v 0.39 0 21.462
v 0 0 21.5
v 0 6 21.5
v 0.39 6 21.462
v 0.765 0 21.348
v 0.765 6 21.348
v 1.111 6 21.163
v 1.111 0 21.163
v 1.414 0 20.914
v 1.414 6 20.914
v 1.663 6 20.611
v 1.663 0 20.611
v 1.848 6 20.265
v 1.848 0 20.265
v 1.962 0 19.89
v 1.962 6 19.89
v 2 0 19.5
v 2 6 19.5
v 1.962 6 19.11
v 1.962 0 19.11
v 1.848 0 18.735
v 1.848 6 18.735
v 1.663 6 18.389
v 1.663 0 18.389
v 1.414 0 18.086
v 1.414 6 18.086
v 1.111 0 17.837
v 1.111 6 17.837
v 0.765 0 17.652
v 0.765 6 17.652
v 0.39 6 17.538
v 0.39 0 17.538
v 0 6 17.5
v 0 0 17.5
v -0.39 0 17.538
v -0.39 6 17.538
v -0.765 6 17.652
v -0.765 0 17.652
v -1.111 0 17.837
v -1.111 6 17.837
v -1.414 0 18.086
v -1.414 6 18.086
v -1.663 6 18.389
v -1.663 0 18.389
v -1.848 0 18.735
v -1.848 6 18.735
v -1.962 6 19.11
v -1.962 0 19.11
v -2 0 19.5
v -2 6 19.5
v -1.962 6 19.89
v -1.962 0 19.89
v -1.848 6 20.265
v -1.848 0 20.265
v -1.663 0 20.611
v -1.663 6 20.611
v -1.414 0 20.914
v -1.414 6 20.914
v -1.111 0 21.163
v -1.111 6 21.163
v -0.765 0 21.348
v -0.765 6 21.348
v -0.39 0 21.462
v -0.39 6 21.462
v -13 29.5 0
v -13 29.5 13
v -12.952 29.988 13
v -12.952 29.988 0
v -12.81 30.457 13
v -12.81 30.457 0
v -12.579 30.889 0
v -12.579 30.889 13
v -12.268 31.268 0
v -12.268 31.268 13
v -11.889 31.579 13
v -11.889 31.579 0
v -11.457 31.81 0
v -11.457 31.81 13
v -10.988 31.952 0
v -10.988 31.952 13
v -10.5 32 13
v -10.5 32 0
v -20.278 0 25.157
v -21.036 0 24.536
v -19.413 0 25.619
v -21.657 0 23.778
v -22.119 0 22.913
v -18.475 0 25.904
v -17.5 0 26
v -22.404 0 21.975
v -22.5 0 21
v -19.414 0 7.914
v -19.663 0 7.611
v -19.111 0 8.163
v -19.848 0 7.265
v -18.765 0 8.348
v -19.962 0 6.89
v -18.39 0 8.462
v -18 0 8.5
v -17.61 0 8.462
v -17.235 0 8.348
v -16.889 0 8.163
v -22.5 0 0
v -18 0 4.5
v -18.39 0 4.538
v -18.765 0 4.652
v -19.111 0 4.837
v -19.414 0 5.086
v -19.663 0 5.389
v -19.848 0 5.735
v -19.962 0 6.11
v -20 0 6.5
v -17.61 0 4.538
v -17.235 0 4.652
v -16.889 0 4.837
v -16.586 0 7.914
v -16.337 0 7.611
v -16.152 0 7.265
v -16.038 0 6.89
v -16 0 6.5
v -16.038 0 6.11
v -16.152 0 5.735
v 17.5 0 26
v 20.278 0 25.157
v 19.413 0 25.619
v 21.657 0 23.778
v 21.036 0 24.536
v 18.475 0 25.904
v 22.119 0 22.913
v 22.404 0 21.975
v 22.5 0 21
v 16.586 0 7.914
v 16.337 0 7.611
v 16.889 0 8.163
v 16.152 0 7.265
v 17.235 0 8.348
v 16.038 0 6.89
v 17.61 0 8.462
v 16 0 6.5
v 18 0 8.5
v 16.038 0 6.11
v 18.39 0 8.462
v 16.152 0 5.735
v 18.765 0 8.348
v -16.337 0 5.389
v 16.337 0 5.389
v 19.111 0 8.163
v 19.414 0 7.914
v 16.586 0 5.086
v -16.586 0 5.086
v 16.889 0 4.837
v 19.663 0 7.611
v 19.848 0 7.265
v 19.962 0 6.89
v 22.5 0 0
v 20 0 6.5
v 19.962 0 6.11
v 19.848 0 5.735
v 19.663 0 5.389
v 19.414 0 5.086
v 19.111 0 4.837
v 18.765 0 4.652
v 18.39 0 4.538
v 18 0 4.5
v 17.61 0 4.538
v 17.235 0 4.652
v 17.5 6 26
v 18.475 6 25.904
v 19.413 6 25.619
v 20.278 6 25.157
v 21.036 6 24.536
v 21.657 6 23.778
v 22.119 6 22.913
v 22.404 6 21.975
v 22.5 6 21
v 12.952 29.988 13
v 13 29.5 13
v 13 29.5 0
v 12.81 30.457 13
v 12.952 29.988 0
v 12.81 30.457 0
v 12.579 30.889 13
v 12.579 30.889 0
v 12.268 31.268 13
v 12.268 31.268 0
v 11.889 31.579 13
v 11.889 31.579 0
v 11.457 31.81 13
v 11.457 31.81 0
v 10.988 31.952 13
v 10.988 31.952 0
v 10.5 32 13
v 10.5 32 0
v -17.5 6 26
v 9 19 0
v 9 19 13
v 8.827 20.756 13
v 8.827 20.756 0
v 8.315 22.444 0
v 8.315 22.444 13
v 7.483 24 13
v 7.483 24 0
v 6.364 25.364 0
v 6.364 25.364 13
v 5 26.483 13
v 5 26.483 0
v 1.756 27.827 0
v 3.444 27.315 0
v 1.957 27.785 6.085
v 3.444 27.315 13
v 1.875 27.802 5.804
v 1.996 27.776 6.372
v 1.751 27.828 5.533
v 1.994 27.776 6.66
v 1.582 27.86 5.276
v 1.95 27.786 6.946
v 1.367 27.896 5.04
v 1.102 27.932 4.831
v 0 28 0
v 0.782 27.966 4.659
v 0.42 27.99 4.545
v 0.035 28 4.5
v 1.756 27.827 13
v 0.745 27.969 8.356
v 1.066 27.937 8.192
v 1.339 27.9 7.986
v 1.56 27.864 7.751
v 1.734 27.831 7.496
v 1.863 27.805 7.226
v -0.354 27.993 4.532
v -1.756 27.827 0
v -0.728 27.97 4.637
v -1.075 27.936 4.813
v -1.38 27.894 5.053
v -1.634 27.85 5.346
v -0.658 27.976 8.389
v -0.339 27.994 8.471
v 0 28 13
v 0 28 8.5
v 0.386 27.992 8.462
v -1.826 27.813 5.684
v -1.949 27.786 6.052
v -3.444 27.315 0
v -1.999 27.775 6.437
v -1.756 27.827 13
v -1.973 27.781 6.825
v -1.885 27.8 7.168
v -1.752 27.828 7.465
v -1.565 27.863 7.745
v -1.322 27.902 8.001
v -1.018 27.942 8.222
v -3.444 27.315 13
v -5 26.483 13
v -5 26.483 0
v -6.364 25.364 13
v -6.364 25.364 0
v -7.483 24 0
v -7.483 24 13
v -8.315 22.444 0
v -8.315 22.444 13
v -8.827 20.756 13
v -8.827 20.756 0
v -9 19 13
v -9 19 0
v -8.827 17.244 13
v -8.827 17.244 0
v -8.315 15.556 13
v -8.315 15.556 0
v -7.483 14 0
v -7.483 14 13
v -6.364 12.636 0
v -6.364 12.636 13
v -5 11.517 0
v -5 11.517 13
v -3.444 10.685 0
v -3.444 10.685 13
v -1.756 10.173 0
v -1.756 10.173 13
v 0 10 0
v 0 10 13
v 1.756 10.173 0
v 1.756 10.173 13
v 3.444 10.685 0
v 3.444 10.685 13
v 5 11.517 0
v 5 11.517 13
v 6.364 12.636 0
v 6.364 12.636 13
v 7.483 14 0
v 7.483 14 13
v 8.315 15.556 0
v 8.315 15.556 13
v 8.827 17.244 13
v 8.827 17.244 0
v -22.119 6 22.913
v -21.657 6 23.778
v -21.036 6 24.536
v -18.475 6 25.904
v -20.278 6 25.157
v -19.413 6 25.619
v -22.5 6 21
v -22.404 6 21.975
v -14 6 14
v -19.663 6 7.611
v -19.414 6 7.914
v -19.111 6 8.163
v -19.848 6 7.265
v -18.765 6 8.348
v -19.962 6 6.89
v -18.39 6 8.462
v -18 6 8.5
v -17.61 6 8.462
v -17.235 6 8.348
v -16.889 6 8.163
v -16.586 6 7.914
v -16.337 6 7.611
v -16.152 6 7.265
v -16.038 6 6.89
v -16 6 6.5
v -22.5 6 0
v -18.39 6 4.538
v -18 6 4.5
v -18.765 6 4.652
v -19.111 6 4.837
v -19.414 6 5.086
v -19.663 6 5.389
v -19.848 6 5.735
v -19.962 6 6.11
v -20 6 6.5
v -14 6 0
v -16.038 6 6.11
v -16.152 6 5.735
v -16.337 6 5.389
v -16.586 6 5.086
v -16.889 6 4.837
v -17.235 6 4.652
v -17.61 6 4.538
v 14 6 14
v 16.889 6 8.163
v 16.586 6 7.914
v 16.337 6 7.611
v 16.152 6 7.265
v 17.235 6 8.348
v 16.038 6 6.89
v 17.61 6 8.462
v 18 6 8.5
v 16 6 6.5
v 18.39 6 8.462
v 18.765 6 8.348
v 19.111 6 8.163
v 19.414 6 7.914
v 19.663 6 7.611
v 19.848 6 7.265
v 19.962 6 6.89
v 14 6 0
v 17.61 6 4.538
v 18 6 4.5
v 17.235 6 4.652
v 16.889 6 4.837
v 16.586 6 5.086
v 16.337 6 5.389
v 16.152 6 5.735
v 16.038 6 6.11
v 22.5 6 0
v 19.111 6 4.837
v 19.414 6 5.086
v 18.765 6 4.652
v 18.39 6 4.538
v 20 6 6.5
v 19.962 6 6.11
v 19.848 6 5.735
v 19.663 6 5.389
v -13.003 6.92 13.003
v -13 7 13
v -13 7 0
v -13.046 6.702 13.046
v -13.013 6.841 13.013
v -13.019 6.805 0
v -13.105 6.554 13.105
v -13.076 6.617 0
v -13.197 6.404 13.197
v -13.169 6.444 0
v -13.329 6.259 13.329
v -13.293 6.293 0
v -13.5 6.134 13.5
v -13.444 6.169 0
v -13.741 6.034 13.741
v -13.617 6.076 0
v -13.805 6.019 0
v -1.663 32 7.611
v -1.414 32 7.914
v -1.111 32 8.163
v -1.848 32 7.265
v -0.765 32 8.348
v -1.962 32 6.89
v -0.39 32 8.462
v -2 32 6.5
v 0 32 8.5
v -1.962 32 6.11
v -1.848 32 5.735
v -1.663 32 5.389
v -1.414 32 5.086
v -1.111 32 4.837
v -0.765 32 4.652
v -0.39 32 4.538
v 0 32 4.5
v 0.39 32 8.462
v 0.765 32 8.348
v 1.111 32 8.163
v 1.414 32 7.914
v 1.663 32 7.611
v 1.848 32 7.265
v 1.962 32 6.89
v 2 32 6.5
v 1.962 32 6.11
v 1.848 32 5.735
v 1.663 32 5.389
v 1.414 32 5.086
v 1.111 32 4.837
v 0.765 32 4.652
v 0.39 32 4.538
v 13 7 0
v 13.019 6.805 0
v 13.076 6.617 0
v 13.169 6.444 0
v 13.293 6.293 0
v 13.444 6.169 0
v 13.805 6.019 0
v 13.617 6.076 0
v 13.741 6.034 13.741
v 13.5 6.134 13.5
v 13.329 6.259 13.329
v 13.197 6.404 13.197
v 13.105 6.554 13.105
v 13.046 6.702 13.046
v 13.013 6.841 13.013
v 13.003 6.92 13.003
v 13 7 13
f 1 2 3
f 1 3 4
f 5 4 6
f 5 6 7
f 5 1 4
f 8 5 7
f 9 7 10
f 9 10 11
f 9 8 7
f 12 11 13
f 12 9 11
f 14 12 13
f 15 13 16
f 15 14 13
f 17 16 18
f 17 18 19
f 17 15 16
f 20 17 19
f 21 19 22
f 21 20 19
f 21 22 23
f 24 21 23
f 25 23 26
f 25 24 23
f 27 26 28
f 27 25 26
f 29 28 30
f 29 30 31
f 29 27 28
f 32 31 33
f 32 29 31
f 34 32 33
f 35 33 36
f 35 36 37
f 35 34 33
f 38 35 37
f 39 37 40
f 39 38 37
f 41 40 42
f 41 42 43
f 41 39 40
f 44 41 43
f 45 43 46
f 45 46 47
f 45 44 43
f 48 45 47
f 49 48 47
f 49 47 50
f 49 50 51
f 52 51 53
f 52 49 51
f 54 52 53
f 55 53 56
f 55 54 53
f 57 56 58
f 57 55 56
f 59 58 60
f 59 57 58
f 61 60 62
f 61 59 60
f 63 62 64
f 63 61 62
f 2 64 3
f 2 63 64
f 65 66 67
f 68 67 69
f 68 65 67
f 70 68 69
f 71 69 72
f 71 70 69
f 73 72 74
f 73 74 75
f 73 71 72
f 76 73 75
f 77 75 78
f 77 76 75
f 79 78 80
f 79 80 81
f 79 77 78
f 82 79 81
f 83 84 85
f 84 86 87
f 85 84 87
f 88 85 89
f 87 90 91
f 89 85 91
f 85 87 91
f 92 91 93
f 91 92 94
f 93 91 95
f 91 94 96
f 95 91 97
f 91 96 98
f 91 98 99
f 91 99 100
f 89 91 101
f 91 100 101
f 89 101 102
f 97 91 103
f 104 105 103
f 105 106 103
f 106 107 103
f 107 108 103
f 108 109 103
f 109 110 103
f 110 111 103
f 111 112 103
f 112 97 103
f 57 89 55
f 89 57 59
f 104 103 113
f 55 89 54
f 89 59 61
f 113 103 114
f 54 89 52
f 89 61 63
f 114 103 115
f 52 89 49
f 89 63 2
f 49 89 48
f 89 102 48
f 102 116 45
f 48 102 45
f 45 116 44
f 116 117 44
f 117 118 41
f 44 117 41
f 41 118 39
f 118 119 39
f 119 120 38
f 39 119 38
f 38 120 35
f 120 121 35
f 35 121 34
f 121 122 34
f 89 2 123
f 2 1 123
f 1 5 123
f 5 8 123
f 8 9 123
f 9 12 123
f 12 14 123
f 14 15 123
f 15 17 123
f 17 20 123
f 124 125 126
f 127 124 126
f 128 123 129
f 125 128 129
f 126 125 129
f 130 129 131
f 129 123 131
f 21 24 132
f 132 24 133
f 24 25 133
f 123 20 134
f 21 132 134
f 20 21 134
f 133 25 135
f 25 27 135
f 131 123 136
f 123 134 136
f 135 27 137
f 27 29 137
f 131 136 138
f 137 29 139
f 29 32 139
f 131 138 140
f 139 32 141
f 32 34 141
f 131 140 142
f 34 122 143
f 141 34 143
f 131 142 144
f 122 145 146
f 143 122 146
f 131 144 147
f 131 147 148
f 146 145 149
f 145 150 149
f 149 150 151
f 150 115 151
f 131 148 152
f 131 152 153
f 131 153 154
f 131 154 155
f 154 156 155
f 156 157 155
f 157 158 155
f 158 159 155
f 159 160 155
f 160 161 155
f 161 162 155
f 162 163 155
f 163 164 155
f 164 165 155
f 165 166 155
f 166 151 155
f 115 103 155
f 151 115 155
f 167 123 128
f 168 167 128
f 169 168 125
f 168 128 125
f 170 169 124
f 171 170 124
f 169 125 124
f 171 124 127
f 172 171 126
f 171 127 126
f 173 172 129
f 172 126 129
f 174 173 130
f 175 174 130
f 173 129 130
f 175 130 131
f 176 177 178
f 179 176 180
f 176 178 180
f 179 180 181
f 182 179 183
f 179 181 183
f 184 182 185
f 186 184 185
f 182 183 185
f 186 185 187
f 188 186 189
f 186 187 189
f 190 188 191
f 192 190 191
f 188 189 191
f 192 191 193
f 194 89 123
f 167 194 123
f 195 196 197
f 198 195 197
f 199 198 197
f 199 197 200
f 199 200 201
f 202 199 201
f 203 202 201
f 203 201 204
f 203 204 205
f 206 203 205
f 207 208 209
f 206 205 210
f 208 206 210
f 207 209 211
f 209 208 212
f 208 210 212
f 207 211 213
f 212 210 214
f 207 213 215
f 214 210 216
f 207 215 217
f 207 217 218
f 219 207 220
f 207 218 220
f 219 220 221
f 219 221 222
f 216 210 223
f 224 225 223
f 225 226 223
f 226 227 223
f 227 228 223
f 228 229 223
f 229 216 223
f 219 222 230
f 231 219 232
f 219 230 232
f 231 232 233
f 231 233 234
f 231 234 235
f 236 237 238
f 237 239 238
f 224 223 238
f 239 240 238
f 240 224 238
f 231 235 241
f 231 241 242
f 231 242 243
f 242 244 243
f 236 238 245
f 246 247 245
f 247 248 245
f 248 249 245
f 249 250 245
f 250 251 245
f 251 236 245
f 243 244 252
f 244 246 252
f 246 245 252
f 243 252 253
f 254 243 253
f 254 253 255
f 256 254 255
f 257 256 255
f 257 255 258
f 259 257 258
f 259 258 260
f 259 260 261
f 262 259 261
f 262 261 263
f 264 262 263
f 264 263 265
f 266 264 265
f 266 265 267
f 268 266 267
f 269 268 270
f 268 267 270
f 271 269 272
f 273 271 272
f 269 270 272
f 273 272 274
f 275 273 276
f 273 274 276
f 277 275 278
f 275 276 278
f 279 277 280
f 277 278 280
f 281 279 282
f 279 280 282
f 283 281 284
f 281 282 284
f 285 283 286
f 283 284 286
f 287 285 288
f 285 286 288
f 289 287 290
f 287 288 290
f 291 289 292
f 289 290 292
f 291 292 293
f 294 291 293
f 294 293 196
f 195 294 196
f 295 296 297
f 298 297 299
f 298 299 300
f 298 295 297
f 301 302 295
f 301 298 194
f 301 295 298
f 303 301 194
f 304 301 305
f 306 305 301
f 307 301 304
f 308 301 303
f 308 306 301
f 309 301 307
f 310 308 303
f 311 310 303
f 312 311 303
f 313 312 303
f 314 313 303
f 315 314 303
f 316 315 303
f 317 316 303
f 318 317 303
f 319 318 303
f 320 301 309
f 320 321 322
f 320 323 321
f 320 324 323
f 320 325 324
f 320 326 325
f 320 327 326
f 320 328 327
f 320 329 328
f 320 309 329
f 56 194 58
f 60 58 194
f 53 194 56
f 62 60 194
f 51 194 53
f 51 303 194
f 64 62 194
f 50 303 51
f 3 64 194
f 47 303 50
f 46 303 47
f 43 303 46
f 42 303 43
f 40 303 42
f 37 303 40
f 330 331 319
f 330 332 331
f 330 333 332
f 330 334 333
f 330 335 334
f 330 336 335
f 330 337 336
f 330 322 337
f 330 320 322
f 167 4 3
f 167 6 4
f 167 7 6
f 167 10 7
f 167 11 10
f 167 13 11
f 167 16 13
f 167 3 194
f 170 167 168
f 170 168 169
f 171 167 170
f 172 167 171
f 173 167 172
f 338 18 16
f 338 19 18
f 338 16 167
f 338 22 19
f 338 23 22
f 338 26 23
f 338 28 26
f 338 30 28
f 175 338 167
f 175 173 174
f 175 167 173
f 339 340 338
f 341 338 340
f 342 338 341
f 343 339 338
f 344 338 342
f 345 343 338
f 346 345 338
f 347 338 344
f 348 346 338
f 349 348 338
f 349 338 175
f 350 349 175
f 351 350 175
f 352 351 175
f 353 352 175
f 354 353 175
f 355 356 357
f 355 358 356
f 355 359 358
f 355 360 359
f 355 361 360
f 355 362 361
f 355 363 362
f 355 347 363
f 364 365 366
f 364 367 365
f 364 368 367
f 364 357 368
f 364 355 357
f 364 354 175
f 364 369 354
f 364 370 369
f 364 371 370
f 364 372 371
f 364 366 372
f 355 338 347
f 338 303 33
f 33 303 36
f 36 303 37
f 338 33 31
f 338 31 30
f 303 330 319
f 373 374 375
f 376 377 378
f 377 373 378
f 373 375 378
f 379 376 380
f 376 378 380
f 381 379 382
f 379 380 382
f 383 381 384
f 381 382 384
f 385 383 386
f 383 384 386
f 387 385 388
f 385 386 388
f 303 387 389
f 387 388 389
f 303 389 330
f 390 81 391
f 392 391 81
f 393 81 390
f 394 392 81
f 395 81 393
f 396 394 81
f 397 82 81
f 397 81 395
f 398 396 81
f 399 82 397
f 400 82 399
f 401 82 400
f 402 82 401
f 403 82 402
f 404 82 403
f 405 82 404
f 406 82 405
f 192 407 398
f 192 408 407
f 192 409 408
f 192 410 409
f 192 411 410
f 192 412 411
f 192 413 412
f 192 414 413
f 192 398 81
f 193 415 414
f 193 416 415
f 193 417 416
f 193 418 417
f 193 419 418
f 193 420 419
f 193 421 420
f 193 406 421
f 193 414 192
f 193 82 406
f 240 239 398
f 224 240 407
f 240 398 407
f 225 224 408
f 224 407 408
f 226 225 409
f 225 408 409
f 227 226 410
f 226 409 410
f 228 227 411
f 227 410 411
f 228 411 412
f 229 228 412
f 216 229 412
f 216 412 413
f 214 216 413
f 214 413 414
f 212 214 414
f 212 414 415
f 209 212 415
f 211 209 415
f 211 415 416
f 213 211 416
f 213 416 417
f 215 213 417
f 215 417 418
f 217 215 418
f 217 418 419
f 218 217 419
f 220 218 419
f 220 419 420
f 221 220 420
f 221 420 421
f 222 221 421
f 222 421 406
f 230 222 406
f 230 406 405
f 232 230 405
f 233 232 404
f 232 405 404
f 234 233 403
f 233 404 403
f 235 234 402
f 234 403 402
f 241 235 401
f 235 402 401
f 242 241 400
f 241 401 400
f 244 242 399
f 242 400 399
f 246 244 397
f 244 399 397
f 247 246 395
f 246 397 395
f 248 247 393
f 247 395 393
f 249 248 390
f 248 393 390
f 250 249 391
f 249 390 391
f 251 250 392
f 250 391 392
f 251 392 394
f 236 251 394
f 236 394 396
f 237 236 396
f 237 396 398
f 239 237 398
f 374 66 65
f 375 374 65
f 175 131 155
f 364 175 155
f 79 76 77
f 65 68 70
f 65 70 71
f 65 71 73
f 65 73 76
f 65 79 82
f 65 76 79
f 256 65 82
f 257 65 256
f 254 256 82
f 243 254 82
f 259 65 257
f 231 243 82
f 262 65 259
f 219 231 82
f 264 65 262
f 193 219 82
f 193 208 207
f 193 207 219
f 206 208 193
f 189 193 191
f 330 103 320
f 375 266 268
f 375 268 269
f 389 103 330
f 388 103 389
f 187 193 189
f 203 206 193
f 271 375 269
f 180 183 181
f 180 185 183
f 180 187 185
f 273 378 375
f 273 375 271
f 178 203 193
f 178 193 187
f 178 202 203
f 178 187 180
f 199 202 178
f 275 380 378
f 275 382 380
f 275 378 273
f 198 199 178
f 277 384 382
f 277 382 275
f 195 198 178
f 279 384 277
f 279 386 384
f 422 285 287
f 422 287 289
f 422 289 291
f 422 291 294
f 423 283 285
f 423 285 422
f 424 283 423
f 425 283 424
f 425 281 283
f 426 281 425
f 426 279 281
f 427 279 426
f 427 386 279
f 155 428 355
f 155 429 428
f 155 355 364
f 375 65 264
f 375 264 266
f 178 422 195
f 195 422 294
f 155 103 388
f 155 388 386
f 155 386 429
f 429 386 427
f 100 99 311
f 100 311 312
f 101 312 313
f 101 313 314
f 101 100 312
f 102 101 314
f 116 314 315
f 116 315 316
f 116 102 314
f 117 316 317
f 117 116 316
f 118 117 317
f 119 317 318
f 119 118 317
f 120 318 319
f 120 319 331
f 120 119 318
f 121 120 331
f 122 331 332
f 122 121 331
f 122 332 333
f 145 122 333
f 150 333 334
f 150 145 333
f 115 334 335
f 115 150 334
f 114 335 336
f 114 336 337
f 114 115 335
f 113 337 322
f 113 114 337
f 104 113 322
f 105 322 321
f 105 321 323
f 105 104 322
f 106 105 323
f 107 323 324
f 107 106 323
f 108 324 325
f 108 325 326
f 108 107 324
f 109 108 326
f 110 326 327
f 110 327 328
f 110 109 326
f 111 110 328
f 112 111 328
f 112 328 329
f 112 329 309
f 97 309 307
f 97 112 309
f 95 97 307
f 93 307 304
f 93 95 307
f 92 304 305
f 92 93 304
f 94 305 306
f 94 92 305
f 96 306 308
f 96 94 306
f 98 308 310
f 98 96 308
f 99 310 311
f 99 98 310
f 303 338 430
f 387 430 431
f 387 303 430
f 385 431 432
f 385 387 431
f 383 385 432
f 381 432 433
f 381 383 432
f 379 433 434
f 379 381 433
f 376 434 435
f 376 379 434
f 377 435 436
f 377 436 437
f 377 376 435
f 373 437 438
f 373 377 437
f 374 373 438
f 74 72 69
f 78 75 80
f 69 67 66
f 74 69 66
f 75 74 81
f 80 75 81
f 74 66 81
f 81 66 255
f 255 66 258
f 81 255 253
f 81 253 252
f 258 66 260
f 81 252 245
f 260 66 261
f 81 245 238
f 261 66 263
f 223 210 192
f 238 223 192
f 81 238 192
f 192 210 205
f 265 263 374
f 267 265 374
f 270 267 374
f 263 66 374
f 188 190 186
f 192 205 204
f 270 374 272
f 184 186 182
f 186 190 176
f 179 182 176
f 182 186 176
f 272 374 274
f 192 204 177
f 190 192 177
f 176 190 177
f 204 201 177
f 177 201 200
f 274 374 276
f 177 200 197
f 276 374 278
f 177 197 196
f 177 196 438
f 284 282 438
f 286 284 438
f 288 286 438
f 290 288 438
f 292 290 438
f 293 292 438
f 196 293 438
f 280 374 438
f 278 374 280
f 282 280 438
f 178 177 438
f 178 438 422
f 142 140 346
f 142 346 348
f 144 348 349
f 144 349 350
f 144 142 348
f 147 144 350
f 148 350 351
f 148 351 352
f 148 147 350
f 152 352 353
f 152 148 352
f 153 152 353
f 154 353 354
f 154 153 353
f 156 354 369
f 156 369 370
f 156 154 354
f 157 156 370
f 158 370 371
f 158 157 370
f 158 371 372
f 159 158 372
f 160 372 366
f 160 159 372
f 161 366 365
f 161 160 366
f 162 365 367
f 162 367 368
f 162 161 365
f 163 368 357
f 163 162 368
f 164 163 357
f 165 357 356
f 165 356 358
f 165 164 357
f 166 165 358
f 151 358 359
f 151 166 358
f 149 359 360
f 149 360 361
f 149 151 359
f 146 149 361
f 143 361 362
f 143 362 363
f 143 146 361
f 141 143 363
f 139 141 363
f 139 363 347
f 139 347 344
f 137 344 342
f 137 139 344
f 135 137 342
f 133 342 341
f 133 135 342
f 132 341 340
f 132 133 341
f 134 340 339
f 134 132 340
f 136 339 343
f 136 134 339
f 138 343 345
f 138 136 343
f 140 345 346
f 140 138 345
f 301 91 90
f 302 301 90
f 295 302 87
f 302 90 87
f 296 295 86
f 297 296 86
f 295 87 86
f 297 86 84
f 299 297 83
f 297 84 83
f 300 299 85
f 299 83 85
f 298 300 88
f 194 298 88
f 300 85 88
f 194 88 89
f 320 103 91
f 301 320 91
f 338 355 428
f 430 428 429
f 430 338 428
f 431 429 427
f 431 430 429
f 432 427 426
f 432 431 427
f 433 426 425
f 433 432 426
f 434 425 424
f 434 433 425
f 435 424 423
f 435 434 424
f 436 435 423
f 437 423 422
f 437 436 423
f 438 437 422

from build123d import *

# Parameters (mm, degrees)
SKETCH1_R               = 2
BOSS_EXTRUDE1_DEPTH     = 6
SKETCH1_3_W             = 26
SKETCH1_3_H             = 13
BOSS_EXTRUDE2_DEPTH     = 32
FILLET1_R               = 2.5
SKETCH2_R               = 9
CUT_EXTRUDE1_DEPTH      = 42.221960167
CUT_EXTRUDE2_REACH      = 48.971
CUT_EXTRUDE2_END_RADIUS = 9
SKETCH3_R               = 2
FILLET2_R               = 1


with BuildPart() as part:
    # Sketch1 → Boss-Extrude1 (new body)
    with BuildSketch(Plane(origin=(0, 0, 0), x_dir=(1, 0, 0), z_dir=(0, 1, 0))):
        with BuildLine():
            Line((-13, 0), (-22.5, 0))
            Line((-22.5, 0), (-22.5, -21))
            ThreePointArc((-22.5, -21), (-21.035533906, -24.535533906), (-17.5, -26))
            Line((-17.5, -26), (17.5, -26))
            ThreePointArc((17.5, -26), (21.035533906, -24.535533906), (22.5, -21))
            Line((22.5, -21), (22.5, 0))
            Line((22.5, 0), (13, 0))
            Line((13, 0), (13, -13))
            Line((13, -13), (-13, -13))
            Line((-13, -13), (-13, 0))
        make_face()
        with Locations(Location((0, -19.5, 0), (0, 0, 270))):
            Circle(SKETCH1_R, mode=Mode.SUBTRACT)
        with Locations(Location((-18, -6.5, 0), (0, 0, 270))):
            Circle(SKETCH1_R, mode=Mode.SUBTRACT)
        with Locations(Location((18, -6.5, 0), (0, 0, 270))):
            Circle(SKETCH1_R, mode=Mode.SUBTRACT)
    extrude(amount=BOSS_EXTRUDE1_DEPTH)

    # Sketch1<3> → Boss-Extrude2 (add)
    with BuildSketch(Plane(origin=(0, 0, 0), x_dir=(1, 0, 0), z_dir=(0, 1, 0))):
        with Locations((0, -6.5)):
            Rectangle(SKETCH1_3_W, SKETCH1_3_H)
    extrude(amount=BOSS_EXTRUDE2_DEPTH)

    # Fillet1
    fillet1_edges = [part.edges().sort_by_distance(p)[0] for p in [
        (-13, 32, 6.5),
        (13, 32, 6.5),
    ]]
    fillet(fillet1_edges, radius=FILLET1_R)

    # Sketch2 → Cut-Extrude1 (cut, through all)
    with BuildSketch(Plane.XY.offset(13)):
        with Locations((0, 19)):
            Circle(SKETCH2_R)
    extrude(amount=-CUT_EXTRUDE1_DEPTH, mode=Mode.SUBTRACT)

    # Cut-Extrude2: up to this cylinder (the profile starts outside it)
    cut_extrude2_end = Plane(origin=(0, 19, 6.5), z_dir=(0, 0, 1)) * Cylinder(CUT_EXTRUDE2_END_RADIUS, 116.942, mode=Mode.PRIVATE)
    # Sketch3 → Cut-Extrude2 (cut, up to the surface)
    with BuildSketch(Plane(origin=(0, 32, 0), x_dir=(1, 0, 0), z_dir=(0, 1, 0)), mode=Mode.PRIVATE) as cut_extrude2_sk1:
        with Locations(Location((0, -6.5, 0), (0, 0, 270))):
            Circle(SKETCH3_R)
    cut_extrude2_tool1 = extrude(cut_extrude2_sk1.sketch, amount=-CUT_EXTRUDE2_REACH, mode=Mode.PRIVATE) - cut_extrude2_end
    add(cut_extrude2_tool1.solids().sort_by_distance((0, 32, 6.5))[0], mode=Mode.SUBTRACT)

    # Fillet2
    fillet2_edges = [part.edges().sort_by_distance(p)[0] for p in [
        (13, 6, 6.5),
        (0, 6, 13),
        (-13, 6, 6.5),
    ]]
    fillet(fillet2_edges, radius=FILLET2_R)


solid = part.part
